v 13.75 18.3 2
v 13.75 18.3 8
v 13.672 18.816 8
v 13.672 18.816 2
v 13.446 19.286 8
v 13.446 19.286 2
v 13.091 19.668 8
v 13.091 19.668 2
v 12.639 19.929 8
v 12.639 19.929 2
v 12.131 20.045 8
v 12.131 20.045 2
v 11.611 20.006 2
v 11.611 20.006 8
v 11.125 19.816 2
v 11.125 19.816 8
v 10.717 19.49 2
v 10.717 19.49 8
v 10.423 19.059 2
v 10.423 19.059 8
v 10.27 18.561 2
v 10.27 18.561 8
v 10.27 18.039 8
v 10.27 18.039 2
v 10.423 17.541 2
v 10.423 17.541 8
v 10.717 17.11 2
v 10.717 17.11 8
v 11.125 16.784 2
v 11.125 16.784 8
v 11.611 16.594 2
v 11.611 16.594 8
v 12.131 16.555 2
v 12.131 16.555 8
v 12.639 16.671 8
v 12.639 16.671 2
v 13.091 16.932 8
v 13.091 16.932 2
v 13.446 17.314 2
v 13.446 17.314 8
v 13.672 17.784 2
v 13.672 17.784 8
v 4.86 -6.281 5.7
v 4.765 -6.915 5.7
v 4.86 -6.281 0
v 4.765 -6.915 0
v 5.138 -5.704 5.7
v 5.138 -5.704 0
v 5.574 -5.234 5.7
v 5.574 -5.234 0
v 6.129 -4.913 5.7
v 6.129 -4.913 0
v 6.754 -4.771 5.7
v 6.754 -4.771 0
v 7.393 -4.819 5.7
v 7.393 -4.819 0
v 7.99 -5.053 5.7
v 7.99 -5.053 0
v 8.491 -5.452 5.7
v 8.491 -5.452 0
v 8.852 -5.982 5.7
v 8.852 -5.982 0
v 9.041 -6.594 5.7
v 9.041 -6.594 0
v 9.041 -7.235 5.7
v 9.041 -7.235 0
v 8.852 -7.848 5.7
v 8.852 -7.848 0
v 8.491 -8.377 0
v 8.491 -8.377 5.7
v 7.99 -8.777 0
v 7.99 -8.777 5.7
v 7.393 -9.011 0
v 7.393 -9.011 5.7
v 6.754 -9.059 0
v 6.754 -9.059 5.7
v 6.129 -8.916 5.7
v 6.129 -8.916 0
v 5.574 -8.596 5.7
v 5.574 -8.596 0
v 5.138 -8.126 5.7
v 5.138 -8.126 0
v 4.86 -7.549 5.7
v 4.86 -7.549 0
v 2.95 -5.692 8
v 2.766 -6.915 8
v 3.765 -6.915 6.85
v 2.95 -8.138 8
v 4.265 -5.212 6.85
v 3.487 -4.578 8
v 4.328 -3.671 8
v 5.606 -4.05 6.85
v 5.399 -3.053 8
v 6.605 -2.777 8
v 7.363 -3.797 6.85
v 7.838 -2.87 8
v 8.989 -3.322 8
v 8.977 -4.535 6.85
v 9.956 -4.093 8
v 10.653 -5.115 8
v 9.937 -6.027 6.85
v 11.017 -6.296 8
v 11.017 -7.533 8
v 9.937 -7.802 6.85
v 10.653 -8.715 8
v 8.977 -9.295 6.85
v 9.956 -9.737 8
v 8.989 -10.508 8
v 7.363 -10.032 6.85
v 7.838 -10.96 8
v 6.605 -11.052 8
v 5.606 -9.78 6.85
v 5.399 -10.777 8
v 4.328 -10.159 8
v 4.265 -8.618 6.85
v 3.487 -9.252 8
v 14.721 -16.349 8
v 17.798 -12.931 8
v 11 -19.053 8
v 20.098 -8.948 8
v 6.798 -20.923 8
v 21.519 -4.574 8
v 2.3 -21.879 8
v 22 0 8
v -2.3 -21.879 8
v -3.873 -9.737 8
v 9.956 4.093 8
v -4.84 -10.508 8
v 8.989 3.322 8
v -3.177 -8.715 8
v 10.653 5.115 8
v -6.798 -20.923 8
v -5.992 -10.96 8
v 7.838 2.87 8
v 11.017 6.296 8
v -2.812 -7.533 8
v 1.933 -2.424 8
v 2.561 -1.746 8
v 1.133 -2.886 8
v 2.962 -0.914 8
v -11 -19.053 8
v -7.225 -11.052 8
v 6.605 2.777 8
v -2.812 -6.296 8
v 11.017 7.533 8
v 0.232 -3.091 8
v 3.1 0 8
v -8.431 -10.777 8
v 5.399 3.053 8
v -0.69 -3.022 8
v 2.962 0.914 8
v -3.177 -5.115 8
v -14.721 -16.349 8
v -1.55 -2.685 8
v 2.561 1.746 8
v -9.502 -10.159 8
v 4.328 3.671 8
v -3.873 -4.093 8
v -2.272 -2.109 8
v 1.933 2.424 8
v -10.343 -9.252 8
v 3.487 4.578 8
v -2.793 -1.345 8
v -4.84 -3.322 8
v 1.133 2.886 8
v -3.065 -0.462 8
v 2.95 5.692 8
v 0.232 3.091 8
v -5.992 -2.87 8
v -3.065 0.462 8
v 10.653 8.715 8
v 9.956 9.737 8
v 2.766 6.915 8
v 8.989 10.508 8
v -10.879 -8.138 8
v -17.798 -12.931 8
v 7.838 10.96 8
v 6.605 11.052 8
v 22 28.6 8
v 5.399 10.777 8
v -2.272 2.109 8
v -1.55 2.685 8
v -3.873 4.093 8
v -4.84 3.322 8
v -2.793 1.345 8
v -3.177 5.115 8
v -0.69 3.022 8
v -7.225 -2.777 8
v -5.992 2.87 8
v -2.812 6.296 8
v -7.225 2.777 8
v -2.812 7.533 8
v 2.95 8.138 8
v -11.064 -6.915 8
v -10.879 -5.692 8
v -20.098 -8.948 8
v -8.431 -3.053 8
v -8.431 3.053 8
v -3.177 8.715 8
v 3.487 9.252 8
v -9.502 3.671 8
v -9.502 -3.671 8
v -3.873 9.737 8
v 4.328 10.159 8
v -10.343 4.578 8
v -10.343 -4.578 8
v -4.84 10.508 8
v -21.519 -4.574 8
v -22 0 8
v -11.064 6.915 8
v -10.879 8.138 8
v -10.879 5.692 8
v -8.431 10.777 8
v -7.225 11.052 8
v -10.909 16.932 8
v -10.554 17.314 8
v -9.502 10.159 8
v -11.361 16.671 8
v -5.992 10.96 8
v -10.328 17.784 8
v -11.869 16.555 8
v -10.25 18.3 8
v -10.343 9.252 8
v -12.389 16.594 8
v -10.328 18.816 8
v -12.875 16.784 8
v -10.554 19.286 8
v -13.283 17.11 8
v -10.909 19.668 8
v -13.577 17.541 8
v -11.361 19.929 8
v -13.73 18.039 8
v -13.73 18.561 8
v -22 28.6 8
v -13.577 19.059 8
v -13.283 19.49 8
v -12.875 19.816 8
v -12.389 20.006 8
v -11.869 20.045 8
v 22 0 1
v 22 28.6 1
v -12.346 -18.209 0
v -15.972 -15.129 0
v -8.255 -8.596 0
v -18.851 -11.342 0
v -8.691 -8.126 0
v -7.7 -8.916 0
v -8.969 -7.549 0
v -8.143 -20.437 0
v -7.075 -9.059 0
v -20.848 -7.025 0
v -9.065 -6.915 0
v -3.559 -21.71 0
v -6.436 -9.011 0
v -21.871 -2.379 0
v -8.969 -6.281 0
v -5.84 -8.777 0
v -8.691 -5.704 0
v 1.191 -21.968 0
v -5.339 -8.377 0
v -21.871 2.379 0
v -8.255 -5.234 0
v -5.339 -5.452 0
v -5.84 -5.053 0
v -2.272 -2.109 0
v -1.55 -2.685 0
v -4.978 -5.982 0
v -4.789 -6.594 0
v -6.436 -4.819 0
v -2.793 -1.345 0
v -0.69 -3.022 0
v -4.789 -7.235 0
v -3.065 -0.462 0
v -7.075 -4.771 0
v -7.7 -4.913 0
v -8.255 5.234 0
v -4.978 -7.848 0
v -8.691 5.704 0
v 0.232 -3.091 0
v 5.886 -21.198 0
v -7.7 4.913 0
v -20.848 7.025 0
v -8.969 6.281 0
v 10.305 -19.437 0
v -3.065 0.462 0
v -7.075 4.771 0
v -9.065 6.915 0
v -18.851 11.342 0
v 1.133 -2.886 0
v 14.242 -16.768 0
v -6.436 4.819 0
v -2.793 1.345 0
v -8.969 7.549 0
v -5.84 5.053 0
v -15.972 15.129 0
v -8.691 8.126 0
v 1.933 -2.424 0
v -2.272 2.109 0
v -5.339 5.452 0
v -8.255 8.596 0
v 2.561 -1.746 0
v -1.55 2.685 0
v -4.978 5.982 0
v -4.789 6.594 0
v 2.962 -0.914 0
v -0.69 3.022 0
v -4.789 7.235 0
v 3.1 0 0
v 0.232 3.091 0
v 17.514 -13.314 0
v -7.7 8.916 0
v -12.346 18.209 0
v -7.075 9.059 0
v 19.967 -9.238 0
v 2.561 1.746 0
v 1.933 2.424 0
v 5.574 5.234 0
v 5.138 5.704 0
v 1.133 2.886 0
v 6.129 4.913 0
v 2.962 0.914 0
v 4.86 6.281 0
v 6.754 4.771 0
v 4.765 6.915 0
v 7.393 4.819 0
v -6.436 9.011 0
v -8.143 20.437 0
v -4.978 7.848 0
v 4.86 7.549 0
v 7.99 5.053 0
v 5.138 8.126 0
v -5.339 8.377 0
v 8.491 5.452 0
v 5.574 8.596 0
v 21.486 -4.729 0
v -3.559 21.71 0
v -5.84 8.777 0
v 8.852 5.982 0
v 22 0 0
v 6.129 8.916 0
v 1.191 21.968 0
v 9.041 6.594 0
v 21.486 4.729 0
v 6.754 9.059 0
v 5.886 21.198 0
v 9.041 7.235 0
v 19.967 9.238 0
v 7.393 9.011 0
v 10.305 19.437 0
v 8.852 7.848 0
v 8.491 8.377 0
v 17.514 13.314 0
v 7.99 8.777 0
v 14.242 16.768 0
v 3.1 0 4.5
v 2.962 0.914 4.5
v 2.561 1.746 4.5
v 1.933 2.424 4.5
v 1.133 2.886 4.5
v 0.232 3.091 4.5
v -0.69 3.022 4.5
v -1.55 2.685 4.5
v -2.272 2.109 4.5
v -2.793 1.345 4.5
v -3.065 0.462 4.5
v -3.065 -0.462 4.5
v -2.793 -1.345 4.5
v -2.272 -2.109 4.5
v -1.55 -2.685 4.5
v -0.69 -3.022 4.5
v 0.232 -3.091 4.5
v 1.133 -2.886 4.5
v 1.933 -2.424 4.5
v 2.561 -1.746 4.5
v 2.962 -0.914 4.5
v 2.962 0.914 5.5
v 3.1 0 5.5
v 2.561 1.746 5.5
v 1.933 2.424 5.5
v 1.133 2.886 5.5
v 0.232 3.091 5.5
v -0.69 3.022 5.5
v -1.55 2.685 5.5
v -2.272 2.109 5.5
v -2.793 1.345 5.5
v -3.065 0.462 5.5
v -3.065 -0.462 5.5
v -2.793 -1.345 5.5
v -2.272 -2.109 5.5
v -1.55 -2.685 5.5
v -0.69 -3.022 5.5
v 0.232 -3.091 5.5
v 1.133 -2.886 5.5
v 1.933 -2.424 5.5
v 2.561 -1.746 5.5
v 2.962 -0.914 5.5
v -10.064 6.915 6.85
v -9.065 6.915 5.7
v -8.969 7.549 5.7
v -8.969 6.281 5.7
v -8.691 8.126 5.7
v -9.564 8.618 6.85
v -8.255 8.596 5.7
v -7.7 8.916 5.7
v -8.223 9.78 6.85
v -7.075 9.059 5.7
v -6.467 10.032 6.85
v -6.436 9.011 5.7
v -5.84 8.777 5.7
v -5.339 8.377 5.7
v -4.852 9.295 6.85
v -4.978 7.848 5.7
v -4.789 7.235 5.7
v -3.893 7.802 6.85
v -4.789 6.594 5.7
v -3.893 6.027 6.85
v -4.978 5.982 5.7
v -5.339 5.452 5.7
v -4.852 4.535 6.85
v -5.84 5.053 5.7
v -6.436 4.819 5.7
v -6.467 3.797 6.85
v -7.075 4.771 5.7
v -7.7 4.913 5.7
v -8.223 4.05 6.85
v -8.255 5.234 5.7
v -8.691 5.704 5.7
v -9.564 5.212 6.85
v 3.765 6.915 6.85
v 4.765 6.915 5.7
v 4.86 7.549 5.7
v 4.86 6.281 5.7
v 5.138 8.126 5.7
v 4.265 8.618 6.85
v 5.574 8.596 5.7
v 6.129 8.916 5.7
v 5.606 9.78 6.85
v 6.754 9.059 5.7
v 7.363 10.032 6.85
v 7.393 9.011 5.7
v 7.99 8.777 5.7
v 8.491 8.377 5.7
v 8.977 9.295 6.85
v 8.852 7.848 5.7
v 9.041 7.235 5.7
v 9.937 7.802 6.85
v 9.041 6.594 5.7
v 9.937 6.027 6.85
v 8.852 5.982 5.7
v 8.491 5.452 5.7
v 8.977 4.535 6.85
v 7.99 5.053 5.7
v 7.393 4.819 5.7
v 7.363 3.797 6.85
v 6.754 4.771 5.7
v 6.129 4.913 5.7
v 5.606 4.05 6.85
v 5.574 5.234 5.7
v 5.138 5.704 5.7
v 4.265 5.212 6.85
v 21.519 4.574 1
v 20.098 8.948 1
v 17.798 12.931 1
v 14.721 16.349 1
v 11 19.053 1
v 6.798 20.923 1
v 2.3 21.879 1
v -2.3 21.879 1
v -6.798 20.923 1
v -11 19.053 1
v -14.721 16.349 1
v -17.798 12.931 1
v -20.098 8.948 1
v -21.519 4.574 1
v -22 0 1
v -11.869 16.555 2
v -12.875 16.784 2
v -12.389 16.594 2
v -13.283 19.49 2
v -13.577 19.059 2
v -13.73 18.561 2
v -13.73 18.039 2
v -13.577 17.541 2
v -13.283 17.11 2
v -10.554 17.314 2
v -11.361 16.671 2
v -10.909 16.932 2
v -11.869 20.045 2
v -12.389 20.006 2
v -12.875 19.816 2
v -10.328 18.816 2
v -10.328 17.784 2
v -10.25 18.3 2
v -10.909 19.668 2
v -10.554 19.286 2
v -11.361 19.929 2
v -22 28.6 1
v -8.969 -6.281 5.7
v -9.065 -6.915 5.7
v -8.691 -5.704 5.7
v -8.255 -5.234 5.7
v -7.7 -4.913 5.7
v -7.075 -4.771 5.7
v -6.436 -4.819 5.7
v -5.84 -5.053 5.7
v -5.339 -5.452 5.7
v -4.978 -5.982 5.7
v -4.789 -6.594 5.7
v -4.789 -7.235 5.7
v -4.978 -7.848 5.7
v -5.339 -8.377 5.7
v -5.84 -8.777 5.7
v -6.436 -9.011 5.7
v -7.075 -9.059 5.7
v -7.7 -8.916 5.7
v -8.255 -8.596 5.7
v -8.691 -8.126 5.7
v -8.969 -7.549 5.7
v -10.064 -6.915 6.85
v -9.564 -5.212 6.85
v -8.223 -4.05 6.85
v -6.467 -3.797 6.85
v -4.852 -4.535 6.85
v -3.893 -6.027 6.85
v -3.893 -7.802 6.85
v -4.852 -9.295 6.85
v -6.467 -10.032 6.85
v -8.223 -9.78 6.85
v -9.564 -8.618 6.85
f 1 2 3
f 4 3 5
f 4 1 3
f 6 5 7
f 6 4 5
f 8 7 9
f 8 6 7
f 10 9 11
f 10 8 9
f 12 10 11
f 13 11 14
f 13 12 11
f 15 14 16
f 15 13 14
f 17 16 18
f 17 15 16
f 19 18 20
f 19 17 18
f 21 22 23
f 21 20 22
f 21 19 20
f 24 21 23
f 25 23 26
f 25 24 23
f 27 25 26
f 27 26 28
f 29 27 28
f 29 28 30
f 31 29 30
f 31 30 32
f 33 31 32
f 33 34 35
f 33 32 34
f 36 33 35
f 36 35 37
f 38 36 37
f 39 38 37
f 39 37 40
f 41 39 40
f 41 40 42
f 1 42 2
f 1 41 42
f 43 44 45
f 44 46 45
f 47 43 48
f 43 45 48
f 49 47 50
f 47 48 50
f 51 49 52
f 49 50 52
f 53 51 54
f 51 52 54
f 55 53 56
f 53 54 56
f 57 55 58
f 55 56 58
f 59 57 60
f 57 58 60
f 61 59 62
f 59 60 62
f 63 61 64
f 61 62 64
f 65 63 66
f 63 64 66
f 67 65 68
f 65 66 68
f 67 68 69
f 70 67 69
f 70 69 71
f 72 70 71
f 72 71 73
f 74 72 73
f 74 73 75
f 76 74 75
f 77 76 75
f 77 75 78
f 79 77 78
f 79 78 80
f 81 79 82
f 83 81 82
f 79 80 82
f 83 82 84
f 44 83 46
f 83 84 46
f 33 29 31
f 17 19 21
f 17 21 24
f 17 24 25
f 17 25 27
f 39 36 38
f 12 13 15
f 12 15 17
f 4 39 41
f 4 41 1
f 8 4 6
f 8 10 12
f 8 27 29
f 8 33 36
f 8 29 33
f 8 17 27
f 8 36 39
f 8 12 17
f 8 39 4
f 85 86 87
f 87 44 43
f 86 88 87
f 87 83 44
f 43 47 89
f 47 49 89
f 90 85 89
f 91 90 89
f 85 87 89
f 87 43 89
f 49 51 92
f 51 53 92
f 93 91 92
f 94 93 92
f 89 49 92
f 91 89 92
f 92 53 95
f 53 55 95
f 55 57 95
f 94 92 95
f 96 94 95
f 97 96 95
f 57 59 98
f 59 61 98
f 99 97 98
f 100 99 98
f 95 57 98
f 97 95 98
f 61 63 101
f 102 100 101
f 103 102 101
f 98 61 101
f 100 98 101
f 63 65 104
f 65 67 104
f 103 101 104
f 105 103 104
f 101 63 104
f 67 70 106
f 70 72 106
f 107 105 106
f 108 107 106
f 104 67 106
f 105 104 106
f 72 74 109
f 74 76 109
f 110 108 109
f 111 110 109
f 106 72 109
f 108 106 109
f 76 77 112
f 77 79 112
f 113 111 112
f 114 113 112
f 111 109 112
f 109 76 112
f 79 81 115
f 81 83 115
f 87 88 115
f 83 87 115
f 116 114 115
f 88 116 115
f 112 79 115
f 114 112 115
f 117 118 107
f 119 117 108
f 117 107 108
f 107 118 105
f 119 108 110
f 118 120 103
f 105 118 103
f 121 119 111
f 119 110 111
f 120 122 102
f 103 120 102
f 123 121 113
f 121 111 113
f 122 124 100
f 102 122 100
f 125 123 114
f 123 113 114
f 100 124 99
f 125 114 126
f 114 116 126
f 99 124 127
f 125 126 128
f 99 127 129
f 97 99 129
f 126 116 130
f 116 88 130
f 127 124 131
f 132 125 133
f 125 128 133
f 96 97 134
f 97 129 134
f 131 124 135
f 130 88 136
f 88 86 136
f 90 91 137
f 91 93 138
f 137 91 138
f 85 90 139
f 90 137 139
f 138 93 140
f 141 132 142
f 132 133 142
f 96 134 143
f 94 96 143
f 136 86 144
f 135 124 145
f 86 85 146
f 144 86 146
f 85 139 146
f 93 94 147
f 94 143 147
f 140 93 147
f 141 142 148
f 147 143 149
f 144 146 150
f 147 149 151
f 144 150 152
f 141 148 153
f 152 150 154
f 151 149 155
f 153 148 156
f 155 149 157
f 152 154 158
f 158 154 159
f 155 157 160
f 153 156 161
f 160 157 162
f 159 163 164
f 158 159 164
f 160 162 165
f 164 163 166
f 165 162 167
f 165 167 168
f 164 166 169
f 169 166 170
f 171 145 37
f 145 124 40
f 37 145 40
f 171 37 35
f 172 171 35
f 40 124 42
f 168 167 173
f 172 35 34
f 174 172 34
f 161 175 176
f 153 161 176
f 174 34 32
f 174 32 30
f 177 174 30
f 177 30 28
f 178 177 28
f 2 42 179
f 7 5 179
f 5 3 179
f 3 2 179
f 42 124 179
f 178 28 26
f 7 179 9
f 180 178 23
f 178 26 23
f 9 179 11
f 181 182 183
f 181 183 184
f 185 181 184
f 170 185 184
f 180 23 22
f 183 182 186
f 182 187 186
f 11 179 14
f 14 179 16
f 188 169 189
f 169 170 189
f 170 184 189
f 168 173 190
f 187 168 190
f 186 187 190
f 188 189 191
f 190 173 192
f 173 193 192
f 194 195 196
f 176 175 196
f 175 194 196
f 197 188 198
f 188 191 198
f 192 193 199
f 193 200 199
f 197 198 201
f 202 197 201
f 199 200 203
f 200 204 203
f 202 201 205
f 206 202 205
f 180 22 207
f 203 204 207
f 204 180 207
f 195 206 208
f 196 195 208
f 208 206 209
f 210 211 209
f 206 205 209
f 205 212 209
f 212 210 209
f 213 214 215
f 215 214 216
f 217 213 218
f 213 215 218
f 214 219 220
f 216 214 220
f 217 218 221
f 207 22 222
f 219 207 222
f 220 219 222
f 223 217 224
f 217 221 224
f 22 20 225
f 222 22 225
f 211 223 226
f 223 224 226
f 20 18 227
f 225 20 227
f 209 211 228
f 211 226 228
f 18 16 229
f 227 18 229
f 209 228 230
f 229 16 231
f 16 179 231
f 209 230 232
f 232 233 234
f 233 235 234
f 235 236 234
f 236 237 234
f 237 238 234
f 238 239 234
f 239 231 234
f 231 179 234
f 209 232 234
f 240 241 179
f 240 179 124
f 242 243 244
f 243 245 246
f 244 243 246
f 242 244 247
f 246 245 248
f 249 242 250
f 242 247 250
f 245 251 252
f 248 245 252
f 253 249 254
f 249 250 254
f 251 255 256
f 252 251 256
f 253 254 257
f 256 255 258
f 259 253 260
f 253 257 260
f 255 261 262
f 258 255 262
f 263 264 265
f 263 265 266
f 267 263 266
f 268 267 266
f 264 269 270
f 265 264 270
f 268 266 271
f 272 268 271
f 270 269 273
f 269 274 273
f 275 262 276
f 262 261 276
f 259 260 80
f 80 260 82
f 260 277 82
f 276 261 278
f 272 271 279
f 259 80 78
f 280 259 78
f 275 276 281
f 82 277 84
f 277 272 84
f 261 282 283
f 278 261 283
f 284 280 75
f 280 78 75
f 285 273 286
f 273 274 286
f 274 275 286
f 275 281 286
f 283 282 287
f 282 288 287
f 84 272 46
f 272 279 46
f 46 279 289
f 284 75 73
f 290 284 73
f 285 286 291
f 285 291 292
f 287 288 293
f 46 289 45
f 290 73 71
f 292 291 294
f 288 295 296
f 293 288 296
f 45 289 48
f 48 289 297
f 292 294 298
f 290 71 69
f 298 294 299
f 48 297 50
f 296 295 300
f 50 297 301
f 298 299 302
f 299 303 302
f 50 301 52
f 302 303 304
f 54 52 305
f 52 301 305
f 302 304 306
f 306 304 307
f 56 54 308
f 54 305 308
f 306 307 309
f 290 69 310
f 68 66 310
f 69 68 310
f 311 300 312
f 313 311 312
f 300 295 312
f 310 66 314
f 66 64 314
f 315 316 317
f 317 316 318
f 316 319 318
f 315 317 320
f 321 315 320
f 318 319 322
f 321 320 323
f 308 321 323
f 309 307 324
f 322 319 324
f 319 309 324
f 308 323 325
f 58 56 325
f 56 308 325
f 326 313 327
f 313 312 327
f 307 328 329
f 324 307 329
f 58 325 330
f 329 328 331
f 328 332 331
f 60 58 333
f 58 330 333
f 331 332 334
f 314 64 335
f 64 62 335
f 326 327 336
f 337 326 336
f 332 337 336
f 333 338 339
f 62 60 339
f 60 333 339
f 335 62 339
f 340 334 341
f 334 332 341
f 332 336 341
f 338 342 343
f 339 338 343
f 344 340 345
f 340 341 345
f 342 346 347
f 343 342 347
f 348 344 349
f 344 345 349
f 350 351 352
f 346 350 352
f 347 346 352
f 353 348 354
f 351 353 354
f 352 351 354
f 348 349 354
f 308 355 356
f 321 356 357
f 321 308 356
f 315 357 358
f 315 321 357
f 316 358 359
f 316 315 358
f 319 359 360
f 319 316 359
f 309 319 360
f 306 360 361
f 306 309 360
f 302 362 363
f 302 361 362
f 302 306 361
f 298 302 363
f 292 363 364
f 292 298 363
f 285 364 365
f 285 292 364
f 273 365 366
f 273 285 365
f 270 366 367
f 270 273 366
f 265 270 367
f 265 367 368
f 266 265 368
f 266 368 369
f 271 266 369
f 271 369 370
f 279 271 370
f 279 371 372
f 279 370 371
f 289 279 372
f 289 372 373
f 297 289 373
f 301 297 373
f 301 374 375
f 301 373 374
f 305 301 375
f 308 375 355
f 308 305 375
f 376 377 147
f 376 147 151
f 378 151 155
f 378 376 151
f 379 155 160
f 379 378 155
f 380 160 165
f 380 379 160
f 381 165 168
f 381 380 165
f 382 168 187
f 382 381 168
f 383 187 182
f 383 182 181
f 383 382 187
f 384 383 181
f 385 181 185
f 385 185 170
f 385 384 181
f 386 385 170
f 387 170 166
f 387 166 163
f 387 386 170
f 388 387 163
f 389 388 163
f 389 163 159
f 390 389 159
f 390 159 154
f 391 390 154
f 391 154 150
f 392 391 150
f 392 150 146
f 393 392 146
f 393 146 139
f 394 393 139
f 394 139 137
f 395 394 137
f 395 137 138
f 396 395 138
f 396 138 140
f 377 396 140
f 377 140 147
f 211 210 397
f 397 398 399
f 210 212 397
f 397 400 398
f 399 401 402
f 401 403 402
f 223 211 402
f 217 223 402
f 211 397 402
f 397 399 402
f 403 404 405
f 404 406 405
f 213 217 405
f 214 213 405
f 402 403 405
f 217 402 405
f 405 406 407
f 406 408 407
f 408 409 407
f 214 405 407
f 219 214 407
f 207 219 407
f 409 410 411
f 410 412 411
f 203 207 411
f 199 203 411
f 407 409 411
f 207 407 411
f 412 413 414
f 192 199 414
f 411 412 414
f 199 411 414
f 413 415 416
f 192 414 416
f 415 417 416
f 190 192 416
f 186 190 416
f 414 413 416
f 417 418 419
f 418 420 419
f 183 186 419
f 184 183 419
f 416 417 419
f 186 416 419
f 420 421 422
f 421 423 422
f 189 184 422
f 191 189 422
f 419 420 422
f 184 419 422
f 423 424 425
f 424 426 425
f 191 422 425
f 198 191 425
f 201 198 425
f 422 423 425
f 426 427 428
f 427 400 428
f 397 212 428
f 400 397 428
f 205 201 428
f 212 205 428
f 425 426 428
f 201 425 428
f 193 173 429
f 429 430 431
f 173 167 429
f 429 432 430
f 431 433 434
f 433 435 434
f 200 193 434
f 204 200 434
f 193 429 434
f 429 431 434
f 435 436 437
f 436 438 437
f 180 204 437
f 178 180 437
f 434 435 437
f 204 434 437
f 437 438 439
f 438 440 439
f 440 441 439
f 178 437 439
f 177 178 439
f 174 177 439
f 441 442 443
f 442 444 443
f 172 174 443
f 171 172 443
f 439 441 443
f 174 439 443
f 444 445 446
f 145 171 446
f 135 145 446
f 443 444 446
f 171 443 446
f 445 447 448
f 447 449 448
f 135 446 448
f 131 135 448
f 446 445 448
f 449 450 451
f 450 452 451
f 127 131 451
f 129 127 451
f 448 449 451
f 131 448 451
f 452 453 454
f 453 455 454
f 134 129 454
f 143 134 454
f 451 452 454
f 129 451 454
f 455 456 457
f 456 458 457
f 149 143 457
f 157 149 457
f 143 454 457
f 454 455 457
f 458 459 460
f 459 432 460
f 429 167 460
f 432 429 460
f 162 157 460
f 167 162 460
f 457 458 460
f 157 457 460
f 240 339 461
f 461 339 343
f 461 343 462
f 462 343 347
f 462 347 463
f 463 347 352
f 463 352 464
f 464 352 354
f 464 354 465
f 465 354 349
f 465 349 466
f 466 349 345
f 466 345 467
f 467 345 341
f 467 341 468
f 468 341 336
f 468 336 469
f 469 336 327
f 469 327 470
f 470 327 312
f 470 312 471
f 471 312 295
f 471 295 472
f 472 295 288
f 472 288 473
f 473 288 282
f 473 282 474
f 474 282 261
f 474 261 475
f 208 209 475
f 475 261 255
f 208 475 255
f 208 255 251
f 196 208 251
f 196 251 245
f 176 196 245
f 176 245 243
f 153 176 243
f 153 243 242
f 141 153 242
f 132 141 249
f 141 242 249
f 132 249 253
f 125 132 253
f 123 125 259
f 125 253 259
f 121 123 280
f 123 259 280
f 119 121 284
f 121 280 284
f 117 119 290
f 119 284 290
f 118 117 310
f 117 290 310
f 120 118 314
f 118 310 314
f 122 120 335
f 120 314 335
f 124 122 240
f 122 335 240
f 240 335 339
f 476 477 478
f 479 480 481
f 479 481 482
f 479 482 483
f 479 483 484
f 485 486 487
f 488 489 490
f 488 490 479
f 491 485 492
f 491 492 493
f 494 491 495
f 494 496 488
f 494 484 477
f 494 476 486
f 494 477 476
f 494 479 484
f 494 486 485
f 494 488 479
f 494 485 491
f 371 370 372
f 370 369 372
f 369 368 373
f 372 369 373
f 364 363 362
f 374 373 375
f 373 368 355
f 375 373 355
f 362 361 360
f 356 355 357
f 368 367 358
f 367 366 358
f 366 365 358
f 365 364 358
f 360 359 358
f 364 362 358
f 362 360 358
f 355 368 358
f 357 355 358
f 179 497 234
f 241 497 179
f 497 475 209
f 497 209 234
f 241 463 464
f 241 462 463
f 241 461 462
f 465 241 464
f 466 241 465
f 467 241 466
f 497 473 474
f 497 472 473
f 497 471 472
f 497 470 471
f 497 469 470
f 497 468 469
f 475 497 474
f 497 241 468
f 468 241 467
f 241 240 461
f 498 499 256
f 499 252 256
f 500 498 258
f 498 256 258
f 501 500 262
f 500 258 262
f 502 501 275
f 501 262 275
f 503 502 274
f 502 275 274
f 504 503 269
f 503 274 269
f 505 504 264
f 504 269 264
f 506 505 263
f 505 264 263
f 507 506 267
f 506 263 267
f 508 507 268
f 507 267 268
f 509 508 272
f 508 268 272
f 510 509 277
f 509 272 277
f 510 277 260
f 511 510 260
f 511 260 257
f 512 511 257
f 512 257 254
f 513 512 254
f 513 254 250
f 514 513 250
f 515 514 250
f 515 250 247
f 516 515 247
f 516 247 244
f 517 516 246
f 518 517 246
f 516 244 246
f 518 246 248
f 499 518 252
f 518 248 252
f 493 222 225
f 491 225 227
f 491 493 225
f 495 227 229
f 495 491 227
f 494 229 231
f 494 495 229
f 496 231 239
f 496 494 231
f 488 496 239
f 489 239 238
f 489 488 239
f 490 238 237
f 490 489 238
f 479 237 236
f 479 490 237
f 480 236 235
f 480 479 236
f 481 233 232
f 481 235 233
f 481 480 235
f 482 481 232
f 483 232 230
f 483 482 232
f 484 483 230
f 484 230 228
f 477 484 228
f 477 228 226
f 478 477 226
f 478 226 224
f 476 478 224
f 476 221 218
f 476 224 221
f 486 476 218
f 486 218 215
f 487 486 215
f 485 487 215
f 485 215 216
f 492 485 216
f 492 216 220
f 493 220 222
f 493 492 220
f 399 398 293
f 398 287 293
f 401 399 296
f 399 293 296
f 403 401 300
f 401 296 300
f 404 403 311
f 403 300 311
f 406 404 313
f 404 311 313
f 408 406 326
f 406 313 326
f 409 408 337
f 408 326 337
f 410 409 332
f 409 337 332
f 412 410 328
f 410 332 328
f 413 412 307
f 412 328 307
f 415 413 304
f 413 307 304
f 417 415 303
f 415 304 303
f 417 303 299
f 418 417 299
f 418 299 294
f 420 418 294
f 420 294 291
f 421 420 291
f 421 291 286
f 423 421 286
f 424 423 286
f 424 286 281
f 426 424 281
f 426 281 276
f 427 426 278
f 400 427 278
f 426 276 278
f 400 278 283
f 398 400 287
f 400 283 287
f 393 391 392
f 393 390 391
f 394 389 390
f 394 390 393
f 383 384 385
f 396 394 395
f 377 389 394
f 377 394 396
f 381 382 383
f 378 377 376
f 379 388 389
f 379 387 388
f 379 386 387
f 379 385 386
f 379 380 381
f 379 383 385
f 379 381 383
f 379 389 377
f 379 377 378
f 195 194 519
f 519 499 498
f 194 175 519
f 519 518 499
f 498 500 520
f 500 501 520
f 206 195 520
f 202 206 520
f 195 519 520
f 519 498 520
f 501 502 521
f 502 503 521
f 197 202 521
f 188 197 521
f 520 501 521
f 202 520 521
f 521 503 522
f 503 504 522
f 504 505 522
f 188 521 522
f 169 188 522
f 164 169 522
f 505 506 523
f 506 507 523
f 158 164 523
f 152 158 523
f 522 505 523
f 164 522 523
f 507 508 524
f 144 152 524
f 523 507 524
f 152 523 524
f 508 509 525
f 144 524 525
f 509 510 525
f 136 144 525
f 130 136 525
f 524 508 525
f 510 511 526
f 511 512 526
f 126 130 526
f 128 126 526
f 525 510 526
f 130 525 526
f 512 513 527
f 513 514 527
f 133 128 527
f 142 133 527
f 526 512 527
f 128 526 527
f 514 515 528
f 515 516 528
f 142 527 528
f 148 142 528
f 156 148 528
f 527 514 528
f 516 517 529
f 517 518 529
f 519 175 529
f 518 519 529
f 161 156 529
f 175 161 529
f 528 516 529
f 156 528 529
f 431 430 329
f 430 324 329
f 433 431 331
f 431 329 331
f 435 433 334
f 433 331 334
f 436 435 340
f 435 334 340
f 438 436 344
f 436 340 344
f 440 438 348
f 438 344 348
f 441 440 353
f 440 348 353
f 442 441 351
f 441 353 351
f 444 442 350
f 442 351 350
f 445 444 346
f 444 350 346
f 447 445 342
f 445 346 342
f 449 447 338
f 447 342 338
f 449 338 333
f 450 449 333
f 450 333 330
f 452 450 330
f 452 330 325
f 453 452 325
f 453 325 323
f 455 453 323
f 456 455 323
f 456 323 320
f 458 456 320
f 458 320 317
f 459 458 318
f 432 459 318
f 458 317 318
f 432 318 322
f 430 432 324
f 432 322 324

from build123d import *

# Parameters (mm, degrees)
SKETCH096_R         = 22
SKETCH096_R_2       = 3.1
PAD057_DEPTH        = 8
HOLE005_D           = 4.3
HOLE005_CSINK_D     = 8.298
HOLE005_CSINK_ANGLE = 82
SKETCH093_R         = 4
PAD058_DEPTH        = 1
PAD059_DEPTH        = 7
SKETCH094_R         = 1.75
POCKET029_DEPTH     = 6.001


with BuildPart() as part:
    # Sketch096 → Pad057 (new body)
    with BuildSketch(Plane.XY):
        Circle(SKETCH096_R)
        Circle(SKETCH096_R_2, mode=Mode.SUBTRACT)
    extrude(amount=PAD057_DEPTH)

    # Hole005 (through all)
    with Locations(Plane.XY.offset(8)):
        with Locations((-6.914797, 6.914797), (6.914797, 6.914797), (6.914797, -6.914797), (-6.914797, -6.914797)):
            CounterSinkHole(HOLE005_D / 2, HOLE005_CSINK_D / 2, counter_sink_angle=HOLE005_CSINK_ANGLE)

    # Sketch093 → Pad058 (join)
    with BuildSketch(Plane.XY.offset(4.5)):
        Circle(SKETCH093_R)
    extrude(amount=PAD058_DEPTH)

    # Sketch095 → Pad059 (join)
    with BuildSketch(Plane.XY.offset(1)):
        with BuildLine():
            Line((-22, 0), (-22, 28.6))
            Line((-22, 28.6), (22, 28.6))
            Line((22, 28.6), (22, 0))
            Line((22, 0), (21, 0))
            ThreePointArc((21, 0), (0, 21), (-21, 0))
            Line((-21, 0), (-22, 0))
        make_face()
    extrude(amount=PAD059_DEPTH)

    # Sketch094 → Pocket029 (cut, through all)
    with BuildSketch(Plane.XY.offset(2)):
        with Locations((-12, 18.3)):
            Circle(SKETCH094_R)
        with Locations((12, 18.3)):
            Circle(SKETCH094_R)
    extrude(amount=POCKET029_DEPTH, mode=Mode.SUBTRACT)


solid = part.part
